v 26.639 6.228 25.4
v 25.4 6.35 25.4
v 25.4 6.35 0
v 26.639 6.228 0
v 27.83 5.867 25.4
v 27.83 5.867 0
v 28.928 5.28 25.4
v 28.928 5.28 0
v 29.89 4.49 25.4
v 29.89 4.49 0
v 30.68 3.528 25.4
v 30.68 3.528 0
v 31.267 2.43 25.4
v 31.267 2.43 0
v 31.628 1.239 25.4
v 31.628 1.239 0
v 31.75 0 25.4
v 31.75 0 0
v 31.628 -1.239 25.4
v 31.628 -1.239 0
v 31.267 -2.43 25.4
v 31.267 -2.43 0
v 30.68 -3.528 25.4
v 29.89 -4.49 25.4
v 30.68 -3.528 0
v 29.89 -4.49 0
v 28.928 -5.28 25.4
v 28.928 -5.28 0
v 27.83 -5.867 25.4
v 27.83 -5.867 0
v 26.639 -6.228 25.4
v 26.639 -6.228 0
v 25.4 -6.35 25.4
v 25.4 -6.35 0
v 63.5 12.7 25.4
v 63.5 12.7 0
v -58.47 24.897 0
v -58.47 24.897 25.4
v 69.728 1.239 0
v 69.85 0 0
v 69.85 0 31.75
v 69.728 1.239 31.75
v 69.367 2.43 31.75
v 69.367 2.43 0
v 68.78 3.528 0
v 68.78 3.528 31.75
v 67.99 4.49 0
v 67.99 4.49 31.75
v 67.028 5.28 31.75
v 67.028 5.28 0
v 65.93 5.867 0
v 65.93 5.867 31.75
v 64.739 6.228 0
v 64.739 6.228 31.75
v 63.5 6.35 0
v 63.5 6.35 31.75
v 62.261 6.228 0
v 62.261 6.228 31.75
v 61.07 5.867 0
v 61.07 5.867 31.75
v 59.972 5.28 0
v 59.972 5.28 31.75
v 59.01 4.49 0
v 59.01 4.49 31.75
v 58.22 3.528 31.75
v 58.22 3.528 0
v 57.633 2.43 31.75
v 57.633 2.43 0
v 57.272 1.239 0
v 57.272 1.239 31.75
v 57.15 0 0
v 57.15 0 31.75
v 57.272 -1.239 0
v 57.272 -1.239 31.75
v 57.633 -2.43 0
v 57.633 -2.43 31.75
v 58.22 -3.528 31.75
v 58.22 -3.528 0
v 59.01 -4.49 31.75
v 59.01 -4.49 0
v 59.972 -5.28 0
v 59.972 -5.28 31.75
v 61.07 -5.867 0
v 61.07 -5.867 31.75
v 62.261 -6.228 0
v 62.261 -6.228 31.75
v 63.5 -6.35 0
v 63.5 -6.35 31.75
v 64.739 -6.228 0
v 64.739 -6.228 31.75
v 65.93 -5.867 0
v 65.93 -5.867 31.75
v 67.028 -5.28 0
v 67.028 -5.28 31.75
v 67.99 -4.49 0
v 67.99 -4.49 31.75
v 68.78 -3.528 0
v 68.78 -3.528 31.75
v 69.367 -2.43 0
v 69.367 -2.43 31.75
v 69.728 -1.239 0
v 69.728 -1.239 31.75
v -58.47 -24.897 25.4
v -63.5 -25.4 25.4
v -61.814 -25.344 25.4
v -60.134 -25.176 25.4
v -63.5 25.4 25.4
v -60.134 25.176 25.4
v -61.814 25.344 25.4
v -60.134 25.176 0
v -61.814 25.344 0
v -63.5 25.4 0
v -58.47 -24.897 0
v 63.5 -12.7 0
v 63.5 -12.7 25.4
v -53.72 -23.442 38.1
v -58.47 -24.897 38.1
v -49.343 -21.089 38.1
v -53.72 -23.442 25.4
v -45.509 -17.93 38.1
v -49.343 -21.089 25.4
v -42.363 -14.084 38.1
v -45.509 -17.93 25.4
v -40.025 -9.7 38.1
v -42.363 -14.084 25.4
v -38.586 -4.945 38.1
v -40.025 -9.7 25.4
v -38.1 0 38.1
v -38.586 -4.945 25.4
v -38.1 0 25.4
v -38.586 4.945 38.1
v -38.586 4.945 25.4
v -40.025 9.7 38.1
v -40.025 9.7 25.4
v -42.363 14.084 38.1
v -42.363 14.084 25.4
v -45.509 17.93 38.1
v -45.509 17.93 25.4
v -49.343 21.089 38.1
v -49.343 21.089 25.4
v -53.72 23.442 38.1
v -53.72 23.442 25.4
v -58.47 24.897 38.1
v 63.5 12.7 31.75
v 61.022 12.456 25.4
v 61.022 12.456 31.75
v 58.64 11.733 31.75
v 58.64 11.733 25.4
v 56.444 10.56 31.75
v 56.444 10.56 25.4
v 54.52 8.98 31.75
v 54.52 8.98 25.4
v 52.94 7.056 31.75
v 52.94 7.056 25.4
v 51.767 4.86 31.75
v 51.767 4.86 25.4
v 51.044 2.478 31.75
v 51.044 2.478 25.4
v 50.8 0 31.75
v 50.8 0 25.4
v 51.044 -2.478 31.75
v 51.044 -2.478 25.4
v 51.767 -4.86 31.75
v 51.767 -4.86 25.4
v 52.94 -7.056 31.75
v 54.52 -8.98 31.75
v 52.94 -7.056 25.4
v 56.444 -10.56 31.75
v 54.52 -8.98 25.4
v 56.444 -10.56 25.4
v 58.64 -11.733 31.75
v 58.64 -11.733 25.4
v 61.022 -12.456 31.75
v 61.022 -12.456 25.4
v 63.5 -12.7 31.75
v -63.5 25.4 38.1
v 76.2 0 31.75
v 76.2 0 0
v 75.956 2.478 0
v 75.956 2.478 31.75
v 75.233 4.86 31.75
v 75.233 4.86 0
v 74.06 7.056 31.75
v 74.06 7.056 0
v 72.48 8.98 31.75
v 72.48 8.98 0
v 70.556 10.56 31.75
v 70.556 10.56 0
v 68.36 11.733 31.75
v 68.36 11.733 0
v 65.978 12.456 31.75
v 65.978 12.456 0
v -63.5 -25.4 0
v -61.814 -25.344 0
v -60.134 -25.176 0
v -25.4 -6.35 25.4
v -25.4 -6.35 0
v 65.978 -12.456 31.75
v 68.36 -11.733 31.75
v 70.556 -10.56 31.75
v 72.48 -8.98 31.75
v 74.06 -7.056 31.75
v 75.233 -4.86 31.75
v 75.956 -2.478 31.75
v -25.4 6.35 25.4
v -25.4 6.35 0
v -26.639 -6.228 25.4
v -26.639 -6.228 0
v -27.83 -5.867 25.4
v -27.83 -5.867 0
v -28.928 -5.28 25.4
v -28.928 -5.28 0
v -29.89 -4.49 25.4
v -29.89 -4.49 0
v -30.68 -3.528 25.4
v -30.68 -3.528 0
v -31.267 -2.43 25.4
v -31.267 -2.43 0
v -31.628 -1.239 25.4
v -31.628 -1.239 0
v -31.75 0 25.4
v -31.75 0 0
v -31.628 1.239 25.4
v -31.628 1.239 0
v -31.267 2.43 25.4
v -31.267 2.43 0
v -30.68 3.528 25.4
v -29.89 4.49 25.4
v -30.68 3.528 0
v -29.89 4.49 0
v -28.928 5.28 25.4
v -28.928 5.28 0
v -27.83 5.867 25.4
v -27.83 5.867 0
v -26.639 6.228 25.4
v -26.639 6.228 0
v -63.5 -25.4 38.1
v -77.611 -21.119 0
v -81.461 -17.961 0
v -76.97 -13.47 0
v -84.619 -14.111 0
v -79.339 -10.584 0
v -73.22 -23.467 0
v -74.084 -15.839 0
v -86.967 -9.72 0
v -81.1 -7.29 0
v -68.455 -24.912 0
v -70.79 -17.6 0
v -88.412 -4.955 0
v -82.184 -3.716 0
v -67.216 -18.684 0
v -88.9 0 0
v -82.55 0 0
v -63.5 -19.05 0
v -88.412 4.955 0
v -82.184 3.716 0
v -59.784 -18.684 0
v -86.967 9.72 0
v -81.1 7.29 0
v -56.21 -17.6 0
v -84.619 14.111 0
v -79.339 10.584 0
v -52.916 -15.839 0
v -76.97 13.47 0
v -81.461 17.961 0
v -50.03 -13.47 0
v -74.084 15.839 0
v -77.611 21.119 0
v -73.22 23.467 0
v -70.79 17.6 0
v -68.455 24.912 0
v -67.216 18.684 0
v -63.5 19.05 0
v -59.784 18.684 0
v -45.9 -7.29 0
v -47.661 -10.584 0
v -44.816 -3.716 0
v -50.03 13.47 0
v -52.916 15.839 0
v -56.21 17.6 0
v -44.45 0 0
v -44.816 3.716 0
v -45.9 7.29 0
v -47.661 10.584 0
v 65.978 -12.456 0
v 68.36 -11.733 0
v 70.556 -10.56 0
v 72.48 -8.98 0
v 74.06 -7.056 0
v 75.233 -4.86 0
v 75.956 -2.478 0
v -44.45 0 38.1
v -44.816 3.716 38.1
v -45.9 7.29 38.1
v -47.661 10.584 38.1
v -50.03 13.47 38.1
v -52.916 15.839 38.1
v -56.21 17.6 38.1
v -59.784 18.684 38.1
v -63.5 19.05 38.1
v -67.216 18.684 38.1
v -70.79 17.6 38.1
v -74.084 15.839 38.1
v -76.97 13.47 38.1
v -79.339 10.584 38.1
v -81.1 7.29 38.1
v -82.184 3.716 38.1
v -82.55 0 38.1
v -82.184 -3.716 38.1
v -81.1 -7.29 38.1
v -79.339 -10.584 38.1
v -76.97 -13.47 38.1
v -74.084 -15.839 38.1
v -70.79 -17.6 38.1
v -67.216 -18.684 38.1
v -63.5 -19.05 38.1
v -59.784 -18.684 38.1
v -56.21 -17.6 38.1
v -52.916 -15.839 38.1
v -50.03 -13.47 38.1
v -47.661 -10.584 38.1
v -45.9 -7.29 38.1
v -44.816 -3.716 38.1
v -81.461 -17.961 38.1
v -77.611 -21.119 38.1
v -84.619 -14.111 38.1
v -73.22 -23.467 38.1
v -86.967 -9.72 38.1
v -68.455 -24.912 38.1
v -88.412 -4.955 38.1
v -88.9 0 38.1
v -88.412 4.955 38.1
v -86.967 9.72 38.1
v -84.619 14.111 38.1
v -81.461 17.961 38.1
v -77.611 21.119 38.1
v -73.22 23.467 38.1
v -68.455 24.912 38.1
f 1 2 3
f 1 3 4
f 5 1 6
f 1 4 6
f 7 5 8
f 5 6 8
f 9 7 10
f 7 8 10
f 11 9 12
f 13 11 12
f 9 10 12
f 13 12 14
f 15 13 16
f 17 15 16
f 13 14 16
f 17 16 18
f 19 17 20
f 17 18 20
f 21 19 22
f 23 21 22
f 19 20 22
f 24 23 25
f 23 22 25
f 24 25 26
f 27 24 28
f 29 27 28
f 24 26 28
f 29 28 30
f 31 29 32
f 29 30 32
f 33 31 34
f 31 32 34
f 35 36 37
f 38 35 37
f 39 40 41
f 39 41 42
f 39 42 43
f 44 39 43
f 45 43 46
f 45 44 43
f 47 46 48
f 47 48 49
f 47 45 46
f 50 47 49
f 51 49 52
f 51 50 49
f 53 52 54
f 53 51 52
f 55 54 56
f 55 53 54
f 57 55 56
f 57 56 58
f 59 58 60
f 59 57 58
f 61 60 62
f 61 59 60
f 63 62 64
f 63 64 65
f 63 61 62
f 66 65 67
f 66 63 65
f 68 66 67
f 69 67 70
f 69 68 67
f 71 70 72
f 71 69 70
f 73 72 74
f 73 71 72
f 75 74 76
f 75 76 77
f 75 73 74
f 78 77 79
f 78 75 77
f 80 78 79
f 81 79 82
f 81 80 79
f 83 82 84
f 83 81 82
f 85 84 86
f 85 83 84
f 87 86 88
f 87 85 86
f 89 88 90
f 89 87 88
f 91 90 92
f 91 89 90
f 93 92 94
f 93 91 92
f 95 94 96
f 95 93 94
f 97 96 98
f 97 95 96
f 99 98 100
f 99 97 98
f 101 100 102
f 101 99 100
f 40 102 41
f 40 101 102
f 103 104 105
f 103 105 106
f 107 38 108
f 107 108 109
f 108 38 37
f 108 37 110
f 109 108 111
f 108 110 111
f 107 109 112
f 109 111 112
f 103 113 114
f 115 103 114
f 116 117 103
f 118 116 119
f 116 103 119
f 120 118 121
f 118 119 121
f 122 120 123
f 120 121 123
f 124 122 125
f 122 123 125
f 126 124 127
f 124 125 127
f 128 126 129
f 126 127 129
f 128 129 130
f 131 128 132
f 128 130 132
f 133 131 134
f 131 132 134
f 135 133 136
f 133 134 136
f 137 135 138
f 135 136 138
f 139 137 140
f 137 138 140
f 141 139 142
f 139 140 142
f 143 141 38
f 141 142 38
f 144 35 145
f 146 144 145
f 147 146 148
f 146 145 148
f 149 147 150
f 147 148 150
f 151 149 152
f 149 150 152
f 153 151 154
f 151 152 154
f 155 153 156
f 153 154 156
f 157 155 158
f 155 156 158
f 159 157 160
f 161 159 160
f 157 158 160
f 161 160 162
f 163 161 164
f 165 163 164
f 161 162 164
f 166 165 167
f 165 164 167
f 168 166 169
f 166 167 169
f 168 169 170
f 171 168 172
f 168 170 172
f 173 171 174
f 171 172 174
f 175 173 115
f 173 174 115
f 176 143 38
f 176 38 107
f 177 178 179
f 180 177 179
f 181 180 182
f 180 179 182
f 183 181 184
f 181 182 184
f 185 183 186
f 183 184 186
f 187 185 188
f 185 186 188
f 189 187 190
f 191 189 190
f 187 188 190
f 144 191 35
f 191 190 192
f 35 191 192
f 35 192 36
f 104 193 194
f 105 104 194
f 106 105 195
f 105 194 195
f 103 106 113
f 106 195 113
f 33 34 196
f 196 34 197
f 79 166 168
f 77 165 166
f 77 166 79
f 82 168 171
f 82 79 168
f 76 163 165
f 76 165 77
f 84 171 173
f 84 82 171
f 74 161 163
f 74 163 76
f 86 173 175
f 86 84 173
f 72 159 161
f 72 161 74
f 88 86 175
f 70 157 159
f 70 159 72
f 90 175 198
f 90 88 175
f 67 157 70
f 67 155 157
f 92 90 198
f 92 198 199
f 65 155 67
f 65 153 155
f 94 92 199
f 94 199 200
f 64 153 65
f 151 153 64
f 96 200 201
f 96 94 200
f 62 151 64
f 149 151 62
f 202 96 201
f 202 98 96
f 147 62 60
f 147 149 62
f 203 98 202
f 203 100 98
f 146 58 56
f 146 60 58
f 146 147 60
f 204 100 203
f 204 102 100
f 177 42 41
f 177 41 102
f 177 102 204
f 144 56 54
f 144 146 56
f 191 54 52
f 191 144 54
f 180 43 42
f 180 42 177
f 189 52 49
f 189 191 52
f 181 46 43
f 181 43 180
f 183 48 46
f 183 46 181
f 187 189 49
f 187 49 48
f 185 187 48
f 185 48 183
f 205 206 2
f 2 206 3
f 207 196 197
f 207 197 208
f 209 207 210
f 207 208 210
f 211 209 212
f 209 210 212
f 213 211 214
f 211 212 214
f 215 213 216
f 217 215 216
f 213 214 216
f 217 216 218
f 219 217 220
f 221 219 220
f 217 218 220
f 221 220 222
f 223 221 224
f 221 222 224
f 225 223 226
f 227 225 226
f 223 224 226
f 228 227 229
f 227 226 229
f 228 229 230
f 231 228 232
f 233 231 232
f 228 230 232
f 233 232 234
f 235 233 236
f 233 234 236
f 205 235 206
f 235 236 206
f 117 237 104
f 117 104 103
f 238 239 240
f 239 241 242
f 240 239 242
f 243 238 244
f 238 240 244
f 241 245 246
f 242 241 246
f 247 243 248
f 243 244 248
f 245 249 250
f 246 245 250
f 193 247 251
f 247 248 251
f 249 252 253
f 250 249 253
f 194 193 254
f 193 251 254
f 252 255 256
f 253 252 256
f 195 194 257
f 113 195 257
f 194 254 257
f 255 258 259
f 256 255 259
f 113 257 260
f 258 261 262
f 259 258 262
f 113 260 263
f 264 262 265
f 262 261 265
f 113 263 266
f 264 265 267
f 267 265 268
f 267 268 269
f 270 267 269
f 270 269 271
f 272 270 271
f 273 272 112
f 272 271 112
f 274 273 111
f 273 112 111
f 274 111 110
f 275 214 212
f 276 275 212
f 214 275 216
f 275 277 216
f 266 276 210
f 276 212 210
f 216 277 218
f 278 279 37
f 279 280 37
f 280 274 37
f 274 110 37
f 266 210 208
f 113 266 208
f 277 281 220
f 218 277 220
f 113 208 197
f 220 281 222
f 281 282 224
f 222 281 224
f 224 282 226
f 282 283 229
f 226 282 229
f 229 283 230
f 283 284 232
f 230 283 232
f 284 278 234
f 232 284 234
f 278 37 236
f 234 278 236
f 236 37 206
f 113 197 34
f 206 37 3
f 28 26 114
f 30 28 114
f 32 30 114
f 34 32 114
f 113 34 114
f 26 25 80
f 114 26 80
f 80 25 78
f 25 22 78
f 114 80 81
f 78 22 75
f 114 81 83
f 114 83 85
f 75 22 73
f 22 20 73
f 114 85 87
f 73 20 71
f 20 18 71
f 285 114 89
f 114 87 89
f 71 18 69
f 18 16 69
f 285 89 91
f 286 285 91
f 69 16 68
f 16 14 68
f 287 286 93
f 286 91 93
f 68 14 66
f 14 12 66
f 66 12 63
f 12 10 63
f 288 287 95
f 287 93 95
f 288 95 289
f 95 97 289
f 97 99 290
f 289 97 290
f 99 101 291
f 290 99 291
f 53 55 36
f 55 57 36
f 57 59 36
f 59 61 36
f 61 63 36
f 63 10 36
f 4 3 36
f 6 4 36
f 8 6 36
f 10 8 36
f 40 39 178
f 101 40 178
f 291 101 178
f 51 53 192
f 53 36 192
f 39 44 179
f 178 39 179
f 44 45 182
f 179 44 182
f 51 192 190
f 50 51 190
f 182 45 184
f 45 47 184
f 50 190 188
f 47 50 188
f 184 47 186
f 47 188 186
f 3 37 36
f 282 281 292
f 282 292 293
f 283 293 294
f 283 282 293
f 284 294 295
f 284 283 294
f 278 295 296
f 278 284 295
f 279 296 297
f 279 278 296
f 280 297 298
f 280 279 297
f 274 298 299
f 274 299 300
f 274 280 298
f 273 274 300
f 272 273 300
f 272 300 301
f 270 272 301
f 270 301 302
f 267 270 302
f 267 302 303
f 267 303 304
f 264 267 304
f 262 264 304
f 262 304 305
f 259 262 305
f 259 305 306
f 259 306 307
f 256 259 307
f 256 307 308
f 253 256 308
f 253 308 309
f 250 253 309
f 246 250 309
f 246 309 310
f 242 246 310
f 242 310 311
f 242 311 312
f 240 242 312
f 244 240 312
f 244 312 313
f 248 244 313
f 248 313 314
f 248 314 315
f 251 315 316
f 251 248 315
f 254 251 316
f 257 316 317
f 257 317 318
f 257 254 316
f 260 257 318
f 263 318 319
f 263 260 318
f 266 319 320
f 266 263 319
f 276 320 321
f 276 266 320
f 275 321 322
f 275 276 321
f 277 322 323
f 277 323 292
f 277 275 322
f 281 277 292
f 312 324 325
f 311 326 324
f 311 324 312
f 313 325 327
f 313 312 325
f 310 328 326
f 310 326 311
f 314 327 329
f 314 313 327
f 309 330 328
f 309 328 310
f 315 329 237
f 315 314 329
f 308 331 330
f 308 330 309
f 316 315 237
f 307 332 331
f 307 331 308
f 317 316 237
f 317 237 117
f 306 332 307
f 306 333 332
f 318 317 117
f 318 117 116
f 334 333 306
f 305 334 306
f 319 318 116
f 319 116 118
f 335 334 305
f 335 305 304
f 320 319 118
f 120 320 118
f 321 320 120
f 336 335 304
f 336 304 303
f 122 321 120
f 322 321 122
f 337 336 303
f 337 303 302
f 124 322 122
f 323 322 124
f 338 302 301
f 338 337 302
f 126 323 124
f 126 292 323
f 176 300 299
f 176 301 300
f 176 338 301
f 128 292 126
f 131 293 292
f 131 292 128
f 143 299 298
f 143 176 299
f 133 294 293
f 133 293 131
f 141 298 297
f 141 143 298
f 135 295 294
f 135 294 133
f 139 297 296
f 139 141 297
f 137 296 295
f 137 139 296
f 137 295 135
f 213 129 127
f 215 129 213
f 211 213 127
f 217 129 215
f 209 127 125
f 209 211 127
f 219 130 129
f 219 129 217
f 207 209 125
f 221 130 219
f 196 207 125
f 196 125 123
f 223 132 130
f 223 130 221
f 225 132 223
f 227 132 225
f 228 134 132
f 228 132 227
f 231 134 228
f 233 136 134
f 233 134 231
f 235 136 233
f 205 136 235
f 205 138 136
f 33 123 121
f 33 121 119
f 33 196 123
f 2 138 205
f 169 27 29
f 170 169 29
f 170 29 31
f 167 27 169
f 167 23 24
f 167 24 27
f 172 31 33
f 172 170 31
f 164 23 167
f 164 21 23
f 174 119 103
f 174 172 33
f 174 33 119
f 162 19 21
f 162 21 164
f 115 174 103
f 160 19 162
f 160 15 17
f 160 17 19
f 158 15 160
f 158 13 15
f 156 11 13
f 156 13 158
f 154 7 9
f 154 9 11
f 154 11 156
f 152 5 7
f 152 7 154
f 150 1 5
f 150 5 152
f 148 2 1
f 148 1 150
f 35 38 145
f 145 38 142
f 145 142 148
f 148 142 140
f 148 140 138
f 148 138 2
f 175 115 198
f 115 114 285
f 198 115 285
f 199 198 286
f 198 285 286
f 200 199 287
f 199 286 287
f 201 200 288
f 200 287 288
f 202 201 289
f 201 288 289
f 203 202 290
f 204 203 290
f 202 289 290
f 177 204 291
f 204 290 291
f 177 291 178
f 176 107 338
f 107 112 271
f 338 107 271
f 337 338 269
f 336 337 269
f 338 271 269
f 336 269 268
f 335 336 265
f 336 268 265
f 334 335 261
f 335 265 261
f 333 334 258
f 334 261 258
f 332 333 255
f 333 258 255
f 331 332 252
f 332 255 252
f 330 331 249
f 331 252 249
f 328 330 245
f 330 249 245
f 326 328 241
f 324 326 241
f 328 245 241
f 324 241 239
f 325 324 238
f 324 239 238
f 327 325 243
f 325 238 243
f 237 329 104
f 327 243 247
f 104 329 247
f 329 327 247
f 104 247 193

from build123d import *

# Parameters (mm, degrees)
F0_R     = 19.05
F1_DEPTH = 25.4
F2_DEPTH = 38.1
F0_R_2   = 6.35
F3_DEPTH = 31.75


with BuildPart() as f1:
    # F0 (on Top) → F1 (new body)
    with BuildSketch(Plane.XY):
        with BuildLine():
            Line((-58.4702970297, 24.897029703), (-63.5, 25.4))
            ThreePointArc((-63.5, 25.4), (-88.9, 0), (-63.5, -25.4))
            Line((-63.5, -25.4), (-58.4702970297, -24.897029703))
            ThreePointArc((-58.4702970297, -24.897029703), (-43.8414846002, -16.0842398725), (-38.1, 0))
            ThreePointArc((-38.1, 0), (-43.8414846002, 16.0842398725), (-58.4702970297, 24.897029703))
        make_face()
        with Locations((-63.5, 0)):
            Circle(F0_R, mode=Mode.SUBTRACT)
        with BuildLine():
            ThreePointArc((-58.4702970297, 24.897029703), (-60.9726055369, 25.2739446313), (-63.5, 25.4))
            Line((-63.5, 25.4), (-58.4702970297, 24.897029703))
        make_face()
        with BuildLine():
            Line((-58.4702970297, -24.897029703), (-63.5, -25.4))
            ThreePointArc((-63.5, -25.4), (-60.9726055369, -25.2739446313), (-58.4702970297, -24.897029703))
        make_face()
        with BuildLine():
            Line((63.5, 12.7), (-58.4702970297, 24.897029703))
            ThreePointArc((-58.4702970297, 24.897029703), (-43.8414846002, 16.0842398725), (-38.1, 0))
            ThreePointArc((-38.1, 0), (-43.8414846002, -16.0842398725), (-58.4702970297, -24.897029703))
            Line((-58.4702970297, -24.897029703), (63.5, -12.7))
            ThreePointArc((63.5, -12.7), (50.8, 0), (63.5, 12.7))
        make_face()
        with BuildLine():
            ThreePointArc((-25.4, -6.35), (-31.75, 0), (-25.4, 6.35))
            Line((-25.4, 6.35), (25.4, 6.35))
            ThreePointArc((25.4, 6.35), (31.75, 0), (25.4, -6.35))
            Line((25.4, -6.35), (-25.4, -6.35))
        make_face(mode=Mode.SUBTRACT)
    extrude(amount=F1_DEPTH)

    # F0 (on Top) → F2 (join)
    with BuildSketch(Plane.XY):
        with BuildLine():
            Line((-58.4702970297, 24.897029703), (-63.5, 25.4))
            ThreePointArc((-63.5, 25.4), (-88.9, 0), (-63.5, -25.4))
            Line((-63.5, -25.4), (-58.4702970297, -24.897029703))
            ThreePointArc((-58.4702970297, -24.897029703), (-43.8414846002, -16.0842398725), (-38.1, 0))
            ThreePointArc((-38.1, 0), (-43.8414846002, 16.0842398725), (-58.4702970297, 24.897029703))
        make_face()
        with Locations((-63.5, 0)):
            Circle(F0_R, mode=Mode.SUBTRACT)
    extrude(amount=F2_DEPTH)

    # F0 (on Top) → F3 (join)
    with BuildSketch(Plane.XY):
        with BuildLine():
            ThreePointArc((76.2, 0), (72.4802561211, 8.9802561211), (63.5, 12.7))
            ThreePointArc((63.5, 12.7), (50.8, 0), (63.5, -12.7))
            ThreePointArc((63.5, -12.7), (72.4802561211, -8.9802561211), (76.2, 0))
        make_face()
        with Locations((63.5, 0)):
            Circle(F0_R_2, mode=Mode.SUBTRACT)
    extrude(amount=F3_DEPTH)


solid = f1.part
